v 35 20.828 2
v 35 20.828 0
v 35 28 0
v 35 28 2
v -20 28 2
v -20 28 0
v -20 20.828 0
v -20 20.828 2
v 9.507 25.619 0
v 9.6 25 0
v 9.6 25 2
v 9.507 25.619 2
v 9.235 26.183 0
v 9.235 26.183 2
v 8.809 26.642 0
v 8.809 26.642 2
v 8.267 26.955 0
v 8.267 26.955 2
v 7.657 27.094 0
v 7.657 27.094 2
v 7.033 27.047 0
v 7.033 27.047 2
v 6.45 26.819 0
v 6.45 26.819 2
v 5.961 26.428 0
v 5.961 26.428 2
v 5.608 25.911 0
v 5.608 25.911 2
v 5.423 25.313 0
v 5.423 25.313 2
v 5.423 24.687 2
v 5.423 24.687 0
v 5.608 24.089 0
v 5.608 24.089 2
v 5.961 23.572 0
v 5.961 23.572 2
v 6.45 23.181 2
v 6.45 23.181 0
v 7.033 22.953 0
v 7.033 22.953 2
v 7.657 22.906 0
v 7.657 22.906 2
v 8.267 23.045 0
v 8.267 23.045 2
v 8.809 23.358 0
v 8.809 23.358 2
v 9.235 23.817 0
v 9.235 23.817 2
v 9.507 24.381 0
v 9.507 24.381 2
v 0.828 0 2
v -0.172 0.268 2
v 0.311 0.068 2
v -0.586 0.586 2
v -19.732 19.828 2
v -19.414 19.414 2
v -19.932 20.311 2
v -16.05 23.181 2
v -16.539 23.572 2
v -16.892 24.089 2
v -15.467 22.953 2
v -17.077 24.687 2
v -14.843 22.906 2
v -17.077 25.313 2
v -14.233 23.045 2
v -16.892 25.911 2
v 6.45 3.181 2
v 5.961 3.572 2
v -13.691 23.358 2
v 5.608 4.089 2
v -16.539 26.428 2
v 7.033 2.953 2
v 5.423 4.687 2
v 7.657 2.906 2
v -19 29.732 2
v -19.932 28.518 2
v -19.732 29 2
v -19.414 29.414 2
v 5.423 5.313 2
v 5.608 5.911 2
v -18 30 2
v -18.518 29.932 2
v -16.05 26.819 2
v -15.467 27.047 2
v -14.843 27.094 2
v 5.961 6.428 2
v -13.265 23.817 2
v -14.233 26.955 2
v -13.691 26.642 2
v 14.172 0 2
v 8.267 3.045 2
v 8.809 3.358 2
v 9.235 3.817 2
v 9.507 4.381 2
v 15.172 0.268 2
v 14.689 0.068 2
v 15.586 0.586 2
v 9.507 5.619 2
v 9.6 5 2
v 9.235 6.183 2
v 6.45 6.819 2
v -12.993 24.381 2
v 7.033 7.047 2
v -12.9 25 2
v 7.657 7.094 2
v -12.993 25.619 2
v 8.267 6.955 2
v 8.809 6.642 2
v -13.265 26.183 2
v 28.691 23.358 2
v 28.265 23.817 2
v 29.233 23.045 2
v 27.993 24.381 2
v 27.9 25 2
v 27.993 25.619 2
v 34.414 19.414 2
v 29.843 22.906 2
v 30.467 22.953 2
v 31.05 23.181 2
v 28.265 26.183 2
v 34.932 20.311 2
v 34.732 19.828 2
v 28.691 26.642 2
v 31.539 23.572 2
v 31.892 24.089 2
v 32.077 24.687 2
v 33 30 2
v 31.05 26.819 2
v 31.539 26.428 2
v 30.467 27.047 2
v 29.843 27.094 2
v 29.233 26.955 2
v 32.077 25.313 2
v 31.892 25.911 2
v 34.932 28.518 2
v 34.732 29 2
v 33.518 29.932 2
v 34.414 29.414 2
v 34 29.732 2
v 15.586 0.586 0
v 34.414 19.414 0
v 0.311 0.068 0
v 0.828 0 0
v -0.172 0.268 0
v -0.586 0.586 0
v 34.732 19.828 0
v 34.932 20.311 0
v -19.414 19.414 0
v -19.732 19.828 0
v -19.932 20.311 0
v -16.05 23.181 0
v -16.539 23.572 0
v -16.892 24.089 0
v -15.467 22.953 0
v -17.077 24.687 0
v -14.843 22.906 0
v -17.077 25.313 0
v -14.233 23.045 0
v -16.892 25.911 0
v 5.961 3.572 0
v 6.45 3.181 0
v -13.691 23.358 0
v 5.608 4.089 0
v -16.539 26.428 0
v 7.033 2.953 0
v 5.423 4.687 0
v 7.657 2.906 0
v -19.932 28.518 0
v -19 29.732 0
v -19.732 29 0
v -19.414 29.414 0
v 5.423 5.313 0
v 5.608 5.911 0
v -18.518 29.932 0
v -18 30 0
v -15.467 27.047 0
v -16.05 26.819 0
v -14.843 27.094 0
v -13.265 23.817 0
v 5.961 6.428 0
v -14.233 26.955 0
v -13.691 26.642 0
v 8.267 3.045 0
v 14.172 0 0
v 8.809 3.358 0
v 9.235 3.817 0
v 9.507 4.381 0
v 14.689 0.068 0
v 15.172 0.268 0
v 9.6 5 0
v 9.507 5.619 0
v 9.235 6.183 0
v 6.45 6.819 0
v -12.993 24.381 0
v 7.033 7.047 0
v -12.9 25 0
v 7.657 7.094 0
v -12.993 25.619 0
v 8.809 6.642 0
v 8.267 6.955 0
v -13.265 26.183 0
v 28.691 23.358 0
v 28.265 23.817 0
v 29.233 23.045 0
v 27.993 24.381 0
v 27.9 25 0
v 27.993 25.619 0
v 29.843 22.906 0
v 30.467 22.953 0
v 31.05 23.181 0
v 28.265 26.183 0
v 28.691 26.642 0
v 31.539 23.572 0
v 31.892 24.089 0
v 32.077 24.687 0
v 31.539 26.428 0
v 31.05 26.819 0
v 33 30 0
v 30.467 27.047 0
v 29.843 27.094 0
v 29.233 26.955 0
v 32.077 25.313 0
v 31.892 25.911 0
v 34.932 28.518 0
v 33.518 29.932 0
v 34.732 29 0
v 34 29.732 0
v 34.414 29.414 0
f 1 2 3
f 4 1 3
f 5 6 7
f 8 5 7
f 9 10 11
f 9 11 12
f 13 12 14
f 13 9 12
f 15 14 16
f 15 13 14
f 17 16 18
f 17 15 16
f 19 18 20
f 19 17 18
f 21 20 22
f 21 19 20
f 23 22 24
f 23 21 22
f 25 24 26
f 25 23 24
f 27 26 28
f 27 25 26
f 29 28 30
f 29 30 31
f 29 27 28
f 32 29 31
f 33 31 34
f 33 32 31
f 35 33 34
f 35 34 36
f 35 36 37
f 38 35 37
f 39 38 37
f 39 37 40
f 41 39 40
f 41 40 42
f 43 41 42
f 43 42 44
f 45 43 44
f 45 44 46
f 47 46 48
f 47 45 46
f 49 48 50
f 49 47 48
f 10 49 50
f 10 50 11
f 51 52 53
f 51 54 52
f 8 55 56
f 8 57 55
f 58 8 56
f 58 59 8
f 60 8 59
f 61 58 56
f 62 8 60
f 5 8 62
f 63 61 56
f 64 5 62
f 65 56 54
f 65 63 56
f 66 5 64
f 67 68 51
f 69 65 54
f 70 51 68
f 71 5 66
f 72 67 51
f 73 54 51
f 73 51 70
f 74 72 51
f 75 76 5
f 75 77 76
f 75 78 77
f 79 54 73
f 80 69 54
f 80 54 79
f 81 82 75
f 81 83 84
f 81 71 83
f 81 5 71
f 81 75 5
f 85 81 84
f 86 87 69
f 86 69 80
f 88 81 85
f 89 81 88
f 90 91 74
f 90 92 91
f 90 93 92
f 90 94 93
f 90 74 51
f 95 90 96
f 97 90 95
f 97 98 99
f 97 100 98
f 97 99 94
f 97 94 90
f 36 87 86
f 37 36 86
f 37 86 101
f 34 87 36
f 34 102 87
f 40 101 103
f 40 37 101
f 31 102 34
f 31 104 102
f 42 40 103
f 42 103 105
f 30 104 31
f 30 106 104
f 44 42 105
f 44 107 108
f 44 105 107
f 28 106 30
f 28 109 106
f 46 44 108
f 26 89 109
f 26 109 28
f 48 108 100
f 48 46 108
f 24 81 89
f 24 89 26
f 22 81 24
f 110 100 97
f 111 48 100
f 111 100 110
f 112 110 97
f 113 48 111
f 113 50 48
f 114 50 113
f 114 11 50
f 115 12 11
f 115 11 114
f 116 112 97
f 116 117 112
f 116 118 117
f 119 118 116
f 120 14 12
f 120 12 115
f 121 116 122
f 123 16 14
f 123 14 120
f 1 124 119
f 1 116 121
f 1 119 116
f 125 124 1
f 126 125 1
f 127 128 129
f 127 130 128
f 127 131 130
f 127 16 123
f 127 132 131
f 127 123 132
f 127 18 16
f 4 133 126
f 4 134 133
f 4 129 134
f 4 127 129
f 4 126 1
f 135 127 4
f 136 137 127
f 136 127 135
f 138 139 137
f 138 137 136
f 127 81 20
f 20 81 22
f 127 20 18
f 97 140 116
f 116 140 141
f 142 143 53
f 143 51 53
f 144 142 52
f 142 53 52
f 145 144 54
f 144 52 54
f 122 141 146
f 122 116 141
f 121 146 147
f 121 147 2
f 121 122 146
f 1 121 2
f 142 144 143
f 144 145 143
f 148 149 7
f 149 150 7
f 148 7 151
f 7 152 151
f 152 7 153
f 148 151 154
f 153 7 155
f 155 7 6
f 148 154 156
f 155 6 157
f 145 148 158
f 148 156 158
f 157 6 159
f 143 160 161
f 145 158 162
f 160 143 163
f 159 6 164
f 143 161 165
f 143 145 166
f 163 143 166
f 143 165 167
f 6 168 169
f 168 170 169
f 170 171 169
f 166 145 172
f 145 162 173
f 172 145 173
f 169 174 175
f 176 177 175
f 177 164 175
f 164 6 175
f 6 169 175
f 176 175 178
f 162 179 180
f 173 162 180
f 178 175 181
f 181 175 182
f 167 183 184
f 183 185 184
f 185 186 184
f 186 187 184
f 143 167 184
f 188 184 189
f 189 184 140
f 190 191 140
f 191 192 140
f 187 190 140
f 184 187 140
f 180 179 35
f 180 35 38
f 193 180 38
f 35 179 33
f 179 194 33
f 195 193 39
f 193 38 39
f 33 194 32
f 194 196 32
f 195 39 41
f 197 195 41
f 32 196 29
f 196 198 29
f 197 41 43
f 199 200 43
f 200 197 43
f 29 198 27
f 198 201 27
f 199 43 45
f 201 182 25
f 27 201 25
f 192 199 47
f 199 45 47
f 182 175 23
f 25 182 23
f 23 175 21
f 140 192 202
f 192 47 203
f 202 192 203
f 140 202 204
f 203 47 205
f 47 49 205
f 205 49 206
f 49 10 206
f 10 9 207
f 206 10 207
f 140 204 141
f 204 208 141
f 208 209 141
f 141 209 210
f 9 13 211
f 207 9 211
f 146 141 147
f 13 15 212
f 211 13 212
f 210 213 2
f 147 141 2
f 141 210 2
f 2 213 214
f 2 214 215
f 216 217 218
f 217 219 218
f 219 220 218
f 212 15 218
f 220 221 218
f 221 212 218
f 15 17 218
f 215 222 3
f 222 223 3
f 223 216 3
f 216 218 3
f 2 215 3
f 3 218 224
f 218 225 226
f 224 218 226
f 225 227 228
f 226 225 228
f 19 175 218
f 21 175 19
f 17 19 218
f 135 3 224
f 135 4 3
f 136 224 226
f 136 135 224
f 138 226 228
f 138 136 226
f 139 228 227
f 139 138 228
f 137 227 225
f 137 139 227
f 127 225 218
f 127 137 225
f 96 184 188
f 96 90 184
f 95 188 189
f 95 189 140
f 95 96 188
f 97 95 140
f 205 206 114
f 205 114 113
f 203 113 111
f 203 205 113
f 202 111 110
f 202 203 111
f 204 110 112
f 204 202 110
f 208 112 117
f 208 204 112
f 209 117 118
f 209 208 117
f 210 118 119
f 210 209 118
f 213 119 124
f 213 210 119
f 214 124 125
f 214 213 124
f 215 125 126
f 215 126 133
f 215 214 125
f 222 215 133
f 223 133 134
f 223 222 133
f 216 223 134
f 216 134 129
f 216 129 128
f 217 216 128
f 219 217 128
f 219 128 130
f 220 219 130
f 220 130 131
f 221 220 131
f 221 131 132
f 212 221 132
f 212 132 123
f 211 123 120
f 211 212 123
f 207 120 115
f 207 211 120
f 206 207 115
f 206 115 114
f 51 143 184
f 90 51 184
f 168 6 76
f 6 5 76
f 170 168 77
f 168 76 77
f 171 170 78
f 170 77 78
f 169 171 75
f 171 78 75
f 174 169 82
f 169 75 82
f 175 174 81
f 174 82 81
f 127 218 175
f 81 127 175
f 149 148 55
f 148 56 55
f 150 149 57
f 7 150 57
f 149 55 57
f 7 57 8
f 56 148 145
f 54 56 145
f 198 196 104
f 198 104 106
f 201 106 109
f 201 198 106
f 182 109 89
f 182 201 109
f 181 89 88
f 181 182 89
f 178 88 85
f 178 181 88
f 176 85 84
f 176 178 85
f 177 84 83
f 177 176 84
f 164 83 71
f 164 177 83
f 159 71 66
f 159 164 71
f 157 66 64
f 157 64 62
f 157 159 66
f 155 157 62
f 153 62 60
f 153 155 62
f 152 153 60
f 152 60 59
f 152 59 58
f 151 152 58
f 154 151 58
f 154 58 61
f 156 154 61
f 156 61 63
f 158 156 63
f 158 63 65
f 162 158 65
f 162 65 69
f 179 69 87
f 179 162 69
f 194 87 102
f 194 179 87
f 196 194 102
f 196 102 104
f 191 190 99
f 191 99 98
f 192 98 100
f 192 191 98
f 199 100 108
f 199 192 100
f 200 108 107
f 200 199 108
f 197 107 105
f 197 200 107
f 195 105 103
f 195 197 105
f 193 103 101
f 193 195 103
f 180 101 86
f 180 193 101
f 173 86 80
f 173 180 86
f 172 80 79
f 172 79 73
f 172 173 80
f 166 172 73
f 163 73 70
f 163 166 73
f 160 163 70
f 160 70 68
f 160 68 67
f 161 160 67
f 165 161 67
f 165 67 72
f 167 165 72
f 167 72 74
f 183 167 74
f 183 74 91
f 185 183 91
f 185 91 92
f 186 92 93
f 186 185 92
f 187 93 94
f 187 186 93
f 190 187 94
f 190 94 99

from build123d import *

# Parameters (mm, degrees)
SKETCH_1_R      = 2.1
EXTRUDE_1_DEPTH = 2
FILLET_1_R      = 2


with BuildPart() as part:
    # ｽｹｯﾁ1 → ﾎﾞｽ - 押し出し1 (new body)
    with BuildSketch(Plane.XY):
        Polygon((0, 0), (15, 0), (35, 20), (35, 30), (-20, 30), (-20, 20), align=None)
        with Locations((-15, 25)):
            Circle(SKETCH_1_R, mode=Mode.SUBTRACT)
        with Locations(Location((30, 25, 0), (0, 0, 180))):
            Circle(SKETCH_1_R, mode=Mode.SUBTRACT)
        with Locations((7.5, 25)):
            Circle(SKETCH_1_R, mode=Mode.SUBTRACT)
        with Locations((7.5, 5)):
            Circle(SKETCH_1_R, mode=Mode.SUBTRACT)
    extrude(amount=EXTRUDE_1_DEPTH)

    # ﾌｨﾚｯﾄ1
    fillet_1_edges = [part.edges().sort_by_distance(p)[0] for p in [
        (-20, 20, 1),
        (-20, 30, 1),
        (35, 30, 1),
        (35, 20, 1),
        (15, 0, 1),
        (0, 0, 1),
    ]]
    fillet(fillet_1_edges, radius=FILLET_1_R)


solid = part.part
